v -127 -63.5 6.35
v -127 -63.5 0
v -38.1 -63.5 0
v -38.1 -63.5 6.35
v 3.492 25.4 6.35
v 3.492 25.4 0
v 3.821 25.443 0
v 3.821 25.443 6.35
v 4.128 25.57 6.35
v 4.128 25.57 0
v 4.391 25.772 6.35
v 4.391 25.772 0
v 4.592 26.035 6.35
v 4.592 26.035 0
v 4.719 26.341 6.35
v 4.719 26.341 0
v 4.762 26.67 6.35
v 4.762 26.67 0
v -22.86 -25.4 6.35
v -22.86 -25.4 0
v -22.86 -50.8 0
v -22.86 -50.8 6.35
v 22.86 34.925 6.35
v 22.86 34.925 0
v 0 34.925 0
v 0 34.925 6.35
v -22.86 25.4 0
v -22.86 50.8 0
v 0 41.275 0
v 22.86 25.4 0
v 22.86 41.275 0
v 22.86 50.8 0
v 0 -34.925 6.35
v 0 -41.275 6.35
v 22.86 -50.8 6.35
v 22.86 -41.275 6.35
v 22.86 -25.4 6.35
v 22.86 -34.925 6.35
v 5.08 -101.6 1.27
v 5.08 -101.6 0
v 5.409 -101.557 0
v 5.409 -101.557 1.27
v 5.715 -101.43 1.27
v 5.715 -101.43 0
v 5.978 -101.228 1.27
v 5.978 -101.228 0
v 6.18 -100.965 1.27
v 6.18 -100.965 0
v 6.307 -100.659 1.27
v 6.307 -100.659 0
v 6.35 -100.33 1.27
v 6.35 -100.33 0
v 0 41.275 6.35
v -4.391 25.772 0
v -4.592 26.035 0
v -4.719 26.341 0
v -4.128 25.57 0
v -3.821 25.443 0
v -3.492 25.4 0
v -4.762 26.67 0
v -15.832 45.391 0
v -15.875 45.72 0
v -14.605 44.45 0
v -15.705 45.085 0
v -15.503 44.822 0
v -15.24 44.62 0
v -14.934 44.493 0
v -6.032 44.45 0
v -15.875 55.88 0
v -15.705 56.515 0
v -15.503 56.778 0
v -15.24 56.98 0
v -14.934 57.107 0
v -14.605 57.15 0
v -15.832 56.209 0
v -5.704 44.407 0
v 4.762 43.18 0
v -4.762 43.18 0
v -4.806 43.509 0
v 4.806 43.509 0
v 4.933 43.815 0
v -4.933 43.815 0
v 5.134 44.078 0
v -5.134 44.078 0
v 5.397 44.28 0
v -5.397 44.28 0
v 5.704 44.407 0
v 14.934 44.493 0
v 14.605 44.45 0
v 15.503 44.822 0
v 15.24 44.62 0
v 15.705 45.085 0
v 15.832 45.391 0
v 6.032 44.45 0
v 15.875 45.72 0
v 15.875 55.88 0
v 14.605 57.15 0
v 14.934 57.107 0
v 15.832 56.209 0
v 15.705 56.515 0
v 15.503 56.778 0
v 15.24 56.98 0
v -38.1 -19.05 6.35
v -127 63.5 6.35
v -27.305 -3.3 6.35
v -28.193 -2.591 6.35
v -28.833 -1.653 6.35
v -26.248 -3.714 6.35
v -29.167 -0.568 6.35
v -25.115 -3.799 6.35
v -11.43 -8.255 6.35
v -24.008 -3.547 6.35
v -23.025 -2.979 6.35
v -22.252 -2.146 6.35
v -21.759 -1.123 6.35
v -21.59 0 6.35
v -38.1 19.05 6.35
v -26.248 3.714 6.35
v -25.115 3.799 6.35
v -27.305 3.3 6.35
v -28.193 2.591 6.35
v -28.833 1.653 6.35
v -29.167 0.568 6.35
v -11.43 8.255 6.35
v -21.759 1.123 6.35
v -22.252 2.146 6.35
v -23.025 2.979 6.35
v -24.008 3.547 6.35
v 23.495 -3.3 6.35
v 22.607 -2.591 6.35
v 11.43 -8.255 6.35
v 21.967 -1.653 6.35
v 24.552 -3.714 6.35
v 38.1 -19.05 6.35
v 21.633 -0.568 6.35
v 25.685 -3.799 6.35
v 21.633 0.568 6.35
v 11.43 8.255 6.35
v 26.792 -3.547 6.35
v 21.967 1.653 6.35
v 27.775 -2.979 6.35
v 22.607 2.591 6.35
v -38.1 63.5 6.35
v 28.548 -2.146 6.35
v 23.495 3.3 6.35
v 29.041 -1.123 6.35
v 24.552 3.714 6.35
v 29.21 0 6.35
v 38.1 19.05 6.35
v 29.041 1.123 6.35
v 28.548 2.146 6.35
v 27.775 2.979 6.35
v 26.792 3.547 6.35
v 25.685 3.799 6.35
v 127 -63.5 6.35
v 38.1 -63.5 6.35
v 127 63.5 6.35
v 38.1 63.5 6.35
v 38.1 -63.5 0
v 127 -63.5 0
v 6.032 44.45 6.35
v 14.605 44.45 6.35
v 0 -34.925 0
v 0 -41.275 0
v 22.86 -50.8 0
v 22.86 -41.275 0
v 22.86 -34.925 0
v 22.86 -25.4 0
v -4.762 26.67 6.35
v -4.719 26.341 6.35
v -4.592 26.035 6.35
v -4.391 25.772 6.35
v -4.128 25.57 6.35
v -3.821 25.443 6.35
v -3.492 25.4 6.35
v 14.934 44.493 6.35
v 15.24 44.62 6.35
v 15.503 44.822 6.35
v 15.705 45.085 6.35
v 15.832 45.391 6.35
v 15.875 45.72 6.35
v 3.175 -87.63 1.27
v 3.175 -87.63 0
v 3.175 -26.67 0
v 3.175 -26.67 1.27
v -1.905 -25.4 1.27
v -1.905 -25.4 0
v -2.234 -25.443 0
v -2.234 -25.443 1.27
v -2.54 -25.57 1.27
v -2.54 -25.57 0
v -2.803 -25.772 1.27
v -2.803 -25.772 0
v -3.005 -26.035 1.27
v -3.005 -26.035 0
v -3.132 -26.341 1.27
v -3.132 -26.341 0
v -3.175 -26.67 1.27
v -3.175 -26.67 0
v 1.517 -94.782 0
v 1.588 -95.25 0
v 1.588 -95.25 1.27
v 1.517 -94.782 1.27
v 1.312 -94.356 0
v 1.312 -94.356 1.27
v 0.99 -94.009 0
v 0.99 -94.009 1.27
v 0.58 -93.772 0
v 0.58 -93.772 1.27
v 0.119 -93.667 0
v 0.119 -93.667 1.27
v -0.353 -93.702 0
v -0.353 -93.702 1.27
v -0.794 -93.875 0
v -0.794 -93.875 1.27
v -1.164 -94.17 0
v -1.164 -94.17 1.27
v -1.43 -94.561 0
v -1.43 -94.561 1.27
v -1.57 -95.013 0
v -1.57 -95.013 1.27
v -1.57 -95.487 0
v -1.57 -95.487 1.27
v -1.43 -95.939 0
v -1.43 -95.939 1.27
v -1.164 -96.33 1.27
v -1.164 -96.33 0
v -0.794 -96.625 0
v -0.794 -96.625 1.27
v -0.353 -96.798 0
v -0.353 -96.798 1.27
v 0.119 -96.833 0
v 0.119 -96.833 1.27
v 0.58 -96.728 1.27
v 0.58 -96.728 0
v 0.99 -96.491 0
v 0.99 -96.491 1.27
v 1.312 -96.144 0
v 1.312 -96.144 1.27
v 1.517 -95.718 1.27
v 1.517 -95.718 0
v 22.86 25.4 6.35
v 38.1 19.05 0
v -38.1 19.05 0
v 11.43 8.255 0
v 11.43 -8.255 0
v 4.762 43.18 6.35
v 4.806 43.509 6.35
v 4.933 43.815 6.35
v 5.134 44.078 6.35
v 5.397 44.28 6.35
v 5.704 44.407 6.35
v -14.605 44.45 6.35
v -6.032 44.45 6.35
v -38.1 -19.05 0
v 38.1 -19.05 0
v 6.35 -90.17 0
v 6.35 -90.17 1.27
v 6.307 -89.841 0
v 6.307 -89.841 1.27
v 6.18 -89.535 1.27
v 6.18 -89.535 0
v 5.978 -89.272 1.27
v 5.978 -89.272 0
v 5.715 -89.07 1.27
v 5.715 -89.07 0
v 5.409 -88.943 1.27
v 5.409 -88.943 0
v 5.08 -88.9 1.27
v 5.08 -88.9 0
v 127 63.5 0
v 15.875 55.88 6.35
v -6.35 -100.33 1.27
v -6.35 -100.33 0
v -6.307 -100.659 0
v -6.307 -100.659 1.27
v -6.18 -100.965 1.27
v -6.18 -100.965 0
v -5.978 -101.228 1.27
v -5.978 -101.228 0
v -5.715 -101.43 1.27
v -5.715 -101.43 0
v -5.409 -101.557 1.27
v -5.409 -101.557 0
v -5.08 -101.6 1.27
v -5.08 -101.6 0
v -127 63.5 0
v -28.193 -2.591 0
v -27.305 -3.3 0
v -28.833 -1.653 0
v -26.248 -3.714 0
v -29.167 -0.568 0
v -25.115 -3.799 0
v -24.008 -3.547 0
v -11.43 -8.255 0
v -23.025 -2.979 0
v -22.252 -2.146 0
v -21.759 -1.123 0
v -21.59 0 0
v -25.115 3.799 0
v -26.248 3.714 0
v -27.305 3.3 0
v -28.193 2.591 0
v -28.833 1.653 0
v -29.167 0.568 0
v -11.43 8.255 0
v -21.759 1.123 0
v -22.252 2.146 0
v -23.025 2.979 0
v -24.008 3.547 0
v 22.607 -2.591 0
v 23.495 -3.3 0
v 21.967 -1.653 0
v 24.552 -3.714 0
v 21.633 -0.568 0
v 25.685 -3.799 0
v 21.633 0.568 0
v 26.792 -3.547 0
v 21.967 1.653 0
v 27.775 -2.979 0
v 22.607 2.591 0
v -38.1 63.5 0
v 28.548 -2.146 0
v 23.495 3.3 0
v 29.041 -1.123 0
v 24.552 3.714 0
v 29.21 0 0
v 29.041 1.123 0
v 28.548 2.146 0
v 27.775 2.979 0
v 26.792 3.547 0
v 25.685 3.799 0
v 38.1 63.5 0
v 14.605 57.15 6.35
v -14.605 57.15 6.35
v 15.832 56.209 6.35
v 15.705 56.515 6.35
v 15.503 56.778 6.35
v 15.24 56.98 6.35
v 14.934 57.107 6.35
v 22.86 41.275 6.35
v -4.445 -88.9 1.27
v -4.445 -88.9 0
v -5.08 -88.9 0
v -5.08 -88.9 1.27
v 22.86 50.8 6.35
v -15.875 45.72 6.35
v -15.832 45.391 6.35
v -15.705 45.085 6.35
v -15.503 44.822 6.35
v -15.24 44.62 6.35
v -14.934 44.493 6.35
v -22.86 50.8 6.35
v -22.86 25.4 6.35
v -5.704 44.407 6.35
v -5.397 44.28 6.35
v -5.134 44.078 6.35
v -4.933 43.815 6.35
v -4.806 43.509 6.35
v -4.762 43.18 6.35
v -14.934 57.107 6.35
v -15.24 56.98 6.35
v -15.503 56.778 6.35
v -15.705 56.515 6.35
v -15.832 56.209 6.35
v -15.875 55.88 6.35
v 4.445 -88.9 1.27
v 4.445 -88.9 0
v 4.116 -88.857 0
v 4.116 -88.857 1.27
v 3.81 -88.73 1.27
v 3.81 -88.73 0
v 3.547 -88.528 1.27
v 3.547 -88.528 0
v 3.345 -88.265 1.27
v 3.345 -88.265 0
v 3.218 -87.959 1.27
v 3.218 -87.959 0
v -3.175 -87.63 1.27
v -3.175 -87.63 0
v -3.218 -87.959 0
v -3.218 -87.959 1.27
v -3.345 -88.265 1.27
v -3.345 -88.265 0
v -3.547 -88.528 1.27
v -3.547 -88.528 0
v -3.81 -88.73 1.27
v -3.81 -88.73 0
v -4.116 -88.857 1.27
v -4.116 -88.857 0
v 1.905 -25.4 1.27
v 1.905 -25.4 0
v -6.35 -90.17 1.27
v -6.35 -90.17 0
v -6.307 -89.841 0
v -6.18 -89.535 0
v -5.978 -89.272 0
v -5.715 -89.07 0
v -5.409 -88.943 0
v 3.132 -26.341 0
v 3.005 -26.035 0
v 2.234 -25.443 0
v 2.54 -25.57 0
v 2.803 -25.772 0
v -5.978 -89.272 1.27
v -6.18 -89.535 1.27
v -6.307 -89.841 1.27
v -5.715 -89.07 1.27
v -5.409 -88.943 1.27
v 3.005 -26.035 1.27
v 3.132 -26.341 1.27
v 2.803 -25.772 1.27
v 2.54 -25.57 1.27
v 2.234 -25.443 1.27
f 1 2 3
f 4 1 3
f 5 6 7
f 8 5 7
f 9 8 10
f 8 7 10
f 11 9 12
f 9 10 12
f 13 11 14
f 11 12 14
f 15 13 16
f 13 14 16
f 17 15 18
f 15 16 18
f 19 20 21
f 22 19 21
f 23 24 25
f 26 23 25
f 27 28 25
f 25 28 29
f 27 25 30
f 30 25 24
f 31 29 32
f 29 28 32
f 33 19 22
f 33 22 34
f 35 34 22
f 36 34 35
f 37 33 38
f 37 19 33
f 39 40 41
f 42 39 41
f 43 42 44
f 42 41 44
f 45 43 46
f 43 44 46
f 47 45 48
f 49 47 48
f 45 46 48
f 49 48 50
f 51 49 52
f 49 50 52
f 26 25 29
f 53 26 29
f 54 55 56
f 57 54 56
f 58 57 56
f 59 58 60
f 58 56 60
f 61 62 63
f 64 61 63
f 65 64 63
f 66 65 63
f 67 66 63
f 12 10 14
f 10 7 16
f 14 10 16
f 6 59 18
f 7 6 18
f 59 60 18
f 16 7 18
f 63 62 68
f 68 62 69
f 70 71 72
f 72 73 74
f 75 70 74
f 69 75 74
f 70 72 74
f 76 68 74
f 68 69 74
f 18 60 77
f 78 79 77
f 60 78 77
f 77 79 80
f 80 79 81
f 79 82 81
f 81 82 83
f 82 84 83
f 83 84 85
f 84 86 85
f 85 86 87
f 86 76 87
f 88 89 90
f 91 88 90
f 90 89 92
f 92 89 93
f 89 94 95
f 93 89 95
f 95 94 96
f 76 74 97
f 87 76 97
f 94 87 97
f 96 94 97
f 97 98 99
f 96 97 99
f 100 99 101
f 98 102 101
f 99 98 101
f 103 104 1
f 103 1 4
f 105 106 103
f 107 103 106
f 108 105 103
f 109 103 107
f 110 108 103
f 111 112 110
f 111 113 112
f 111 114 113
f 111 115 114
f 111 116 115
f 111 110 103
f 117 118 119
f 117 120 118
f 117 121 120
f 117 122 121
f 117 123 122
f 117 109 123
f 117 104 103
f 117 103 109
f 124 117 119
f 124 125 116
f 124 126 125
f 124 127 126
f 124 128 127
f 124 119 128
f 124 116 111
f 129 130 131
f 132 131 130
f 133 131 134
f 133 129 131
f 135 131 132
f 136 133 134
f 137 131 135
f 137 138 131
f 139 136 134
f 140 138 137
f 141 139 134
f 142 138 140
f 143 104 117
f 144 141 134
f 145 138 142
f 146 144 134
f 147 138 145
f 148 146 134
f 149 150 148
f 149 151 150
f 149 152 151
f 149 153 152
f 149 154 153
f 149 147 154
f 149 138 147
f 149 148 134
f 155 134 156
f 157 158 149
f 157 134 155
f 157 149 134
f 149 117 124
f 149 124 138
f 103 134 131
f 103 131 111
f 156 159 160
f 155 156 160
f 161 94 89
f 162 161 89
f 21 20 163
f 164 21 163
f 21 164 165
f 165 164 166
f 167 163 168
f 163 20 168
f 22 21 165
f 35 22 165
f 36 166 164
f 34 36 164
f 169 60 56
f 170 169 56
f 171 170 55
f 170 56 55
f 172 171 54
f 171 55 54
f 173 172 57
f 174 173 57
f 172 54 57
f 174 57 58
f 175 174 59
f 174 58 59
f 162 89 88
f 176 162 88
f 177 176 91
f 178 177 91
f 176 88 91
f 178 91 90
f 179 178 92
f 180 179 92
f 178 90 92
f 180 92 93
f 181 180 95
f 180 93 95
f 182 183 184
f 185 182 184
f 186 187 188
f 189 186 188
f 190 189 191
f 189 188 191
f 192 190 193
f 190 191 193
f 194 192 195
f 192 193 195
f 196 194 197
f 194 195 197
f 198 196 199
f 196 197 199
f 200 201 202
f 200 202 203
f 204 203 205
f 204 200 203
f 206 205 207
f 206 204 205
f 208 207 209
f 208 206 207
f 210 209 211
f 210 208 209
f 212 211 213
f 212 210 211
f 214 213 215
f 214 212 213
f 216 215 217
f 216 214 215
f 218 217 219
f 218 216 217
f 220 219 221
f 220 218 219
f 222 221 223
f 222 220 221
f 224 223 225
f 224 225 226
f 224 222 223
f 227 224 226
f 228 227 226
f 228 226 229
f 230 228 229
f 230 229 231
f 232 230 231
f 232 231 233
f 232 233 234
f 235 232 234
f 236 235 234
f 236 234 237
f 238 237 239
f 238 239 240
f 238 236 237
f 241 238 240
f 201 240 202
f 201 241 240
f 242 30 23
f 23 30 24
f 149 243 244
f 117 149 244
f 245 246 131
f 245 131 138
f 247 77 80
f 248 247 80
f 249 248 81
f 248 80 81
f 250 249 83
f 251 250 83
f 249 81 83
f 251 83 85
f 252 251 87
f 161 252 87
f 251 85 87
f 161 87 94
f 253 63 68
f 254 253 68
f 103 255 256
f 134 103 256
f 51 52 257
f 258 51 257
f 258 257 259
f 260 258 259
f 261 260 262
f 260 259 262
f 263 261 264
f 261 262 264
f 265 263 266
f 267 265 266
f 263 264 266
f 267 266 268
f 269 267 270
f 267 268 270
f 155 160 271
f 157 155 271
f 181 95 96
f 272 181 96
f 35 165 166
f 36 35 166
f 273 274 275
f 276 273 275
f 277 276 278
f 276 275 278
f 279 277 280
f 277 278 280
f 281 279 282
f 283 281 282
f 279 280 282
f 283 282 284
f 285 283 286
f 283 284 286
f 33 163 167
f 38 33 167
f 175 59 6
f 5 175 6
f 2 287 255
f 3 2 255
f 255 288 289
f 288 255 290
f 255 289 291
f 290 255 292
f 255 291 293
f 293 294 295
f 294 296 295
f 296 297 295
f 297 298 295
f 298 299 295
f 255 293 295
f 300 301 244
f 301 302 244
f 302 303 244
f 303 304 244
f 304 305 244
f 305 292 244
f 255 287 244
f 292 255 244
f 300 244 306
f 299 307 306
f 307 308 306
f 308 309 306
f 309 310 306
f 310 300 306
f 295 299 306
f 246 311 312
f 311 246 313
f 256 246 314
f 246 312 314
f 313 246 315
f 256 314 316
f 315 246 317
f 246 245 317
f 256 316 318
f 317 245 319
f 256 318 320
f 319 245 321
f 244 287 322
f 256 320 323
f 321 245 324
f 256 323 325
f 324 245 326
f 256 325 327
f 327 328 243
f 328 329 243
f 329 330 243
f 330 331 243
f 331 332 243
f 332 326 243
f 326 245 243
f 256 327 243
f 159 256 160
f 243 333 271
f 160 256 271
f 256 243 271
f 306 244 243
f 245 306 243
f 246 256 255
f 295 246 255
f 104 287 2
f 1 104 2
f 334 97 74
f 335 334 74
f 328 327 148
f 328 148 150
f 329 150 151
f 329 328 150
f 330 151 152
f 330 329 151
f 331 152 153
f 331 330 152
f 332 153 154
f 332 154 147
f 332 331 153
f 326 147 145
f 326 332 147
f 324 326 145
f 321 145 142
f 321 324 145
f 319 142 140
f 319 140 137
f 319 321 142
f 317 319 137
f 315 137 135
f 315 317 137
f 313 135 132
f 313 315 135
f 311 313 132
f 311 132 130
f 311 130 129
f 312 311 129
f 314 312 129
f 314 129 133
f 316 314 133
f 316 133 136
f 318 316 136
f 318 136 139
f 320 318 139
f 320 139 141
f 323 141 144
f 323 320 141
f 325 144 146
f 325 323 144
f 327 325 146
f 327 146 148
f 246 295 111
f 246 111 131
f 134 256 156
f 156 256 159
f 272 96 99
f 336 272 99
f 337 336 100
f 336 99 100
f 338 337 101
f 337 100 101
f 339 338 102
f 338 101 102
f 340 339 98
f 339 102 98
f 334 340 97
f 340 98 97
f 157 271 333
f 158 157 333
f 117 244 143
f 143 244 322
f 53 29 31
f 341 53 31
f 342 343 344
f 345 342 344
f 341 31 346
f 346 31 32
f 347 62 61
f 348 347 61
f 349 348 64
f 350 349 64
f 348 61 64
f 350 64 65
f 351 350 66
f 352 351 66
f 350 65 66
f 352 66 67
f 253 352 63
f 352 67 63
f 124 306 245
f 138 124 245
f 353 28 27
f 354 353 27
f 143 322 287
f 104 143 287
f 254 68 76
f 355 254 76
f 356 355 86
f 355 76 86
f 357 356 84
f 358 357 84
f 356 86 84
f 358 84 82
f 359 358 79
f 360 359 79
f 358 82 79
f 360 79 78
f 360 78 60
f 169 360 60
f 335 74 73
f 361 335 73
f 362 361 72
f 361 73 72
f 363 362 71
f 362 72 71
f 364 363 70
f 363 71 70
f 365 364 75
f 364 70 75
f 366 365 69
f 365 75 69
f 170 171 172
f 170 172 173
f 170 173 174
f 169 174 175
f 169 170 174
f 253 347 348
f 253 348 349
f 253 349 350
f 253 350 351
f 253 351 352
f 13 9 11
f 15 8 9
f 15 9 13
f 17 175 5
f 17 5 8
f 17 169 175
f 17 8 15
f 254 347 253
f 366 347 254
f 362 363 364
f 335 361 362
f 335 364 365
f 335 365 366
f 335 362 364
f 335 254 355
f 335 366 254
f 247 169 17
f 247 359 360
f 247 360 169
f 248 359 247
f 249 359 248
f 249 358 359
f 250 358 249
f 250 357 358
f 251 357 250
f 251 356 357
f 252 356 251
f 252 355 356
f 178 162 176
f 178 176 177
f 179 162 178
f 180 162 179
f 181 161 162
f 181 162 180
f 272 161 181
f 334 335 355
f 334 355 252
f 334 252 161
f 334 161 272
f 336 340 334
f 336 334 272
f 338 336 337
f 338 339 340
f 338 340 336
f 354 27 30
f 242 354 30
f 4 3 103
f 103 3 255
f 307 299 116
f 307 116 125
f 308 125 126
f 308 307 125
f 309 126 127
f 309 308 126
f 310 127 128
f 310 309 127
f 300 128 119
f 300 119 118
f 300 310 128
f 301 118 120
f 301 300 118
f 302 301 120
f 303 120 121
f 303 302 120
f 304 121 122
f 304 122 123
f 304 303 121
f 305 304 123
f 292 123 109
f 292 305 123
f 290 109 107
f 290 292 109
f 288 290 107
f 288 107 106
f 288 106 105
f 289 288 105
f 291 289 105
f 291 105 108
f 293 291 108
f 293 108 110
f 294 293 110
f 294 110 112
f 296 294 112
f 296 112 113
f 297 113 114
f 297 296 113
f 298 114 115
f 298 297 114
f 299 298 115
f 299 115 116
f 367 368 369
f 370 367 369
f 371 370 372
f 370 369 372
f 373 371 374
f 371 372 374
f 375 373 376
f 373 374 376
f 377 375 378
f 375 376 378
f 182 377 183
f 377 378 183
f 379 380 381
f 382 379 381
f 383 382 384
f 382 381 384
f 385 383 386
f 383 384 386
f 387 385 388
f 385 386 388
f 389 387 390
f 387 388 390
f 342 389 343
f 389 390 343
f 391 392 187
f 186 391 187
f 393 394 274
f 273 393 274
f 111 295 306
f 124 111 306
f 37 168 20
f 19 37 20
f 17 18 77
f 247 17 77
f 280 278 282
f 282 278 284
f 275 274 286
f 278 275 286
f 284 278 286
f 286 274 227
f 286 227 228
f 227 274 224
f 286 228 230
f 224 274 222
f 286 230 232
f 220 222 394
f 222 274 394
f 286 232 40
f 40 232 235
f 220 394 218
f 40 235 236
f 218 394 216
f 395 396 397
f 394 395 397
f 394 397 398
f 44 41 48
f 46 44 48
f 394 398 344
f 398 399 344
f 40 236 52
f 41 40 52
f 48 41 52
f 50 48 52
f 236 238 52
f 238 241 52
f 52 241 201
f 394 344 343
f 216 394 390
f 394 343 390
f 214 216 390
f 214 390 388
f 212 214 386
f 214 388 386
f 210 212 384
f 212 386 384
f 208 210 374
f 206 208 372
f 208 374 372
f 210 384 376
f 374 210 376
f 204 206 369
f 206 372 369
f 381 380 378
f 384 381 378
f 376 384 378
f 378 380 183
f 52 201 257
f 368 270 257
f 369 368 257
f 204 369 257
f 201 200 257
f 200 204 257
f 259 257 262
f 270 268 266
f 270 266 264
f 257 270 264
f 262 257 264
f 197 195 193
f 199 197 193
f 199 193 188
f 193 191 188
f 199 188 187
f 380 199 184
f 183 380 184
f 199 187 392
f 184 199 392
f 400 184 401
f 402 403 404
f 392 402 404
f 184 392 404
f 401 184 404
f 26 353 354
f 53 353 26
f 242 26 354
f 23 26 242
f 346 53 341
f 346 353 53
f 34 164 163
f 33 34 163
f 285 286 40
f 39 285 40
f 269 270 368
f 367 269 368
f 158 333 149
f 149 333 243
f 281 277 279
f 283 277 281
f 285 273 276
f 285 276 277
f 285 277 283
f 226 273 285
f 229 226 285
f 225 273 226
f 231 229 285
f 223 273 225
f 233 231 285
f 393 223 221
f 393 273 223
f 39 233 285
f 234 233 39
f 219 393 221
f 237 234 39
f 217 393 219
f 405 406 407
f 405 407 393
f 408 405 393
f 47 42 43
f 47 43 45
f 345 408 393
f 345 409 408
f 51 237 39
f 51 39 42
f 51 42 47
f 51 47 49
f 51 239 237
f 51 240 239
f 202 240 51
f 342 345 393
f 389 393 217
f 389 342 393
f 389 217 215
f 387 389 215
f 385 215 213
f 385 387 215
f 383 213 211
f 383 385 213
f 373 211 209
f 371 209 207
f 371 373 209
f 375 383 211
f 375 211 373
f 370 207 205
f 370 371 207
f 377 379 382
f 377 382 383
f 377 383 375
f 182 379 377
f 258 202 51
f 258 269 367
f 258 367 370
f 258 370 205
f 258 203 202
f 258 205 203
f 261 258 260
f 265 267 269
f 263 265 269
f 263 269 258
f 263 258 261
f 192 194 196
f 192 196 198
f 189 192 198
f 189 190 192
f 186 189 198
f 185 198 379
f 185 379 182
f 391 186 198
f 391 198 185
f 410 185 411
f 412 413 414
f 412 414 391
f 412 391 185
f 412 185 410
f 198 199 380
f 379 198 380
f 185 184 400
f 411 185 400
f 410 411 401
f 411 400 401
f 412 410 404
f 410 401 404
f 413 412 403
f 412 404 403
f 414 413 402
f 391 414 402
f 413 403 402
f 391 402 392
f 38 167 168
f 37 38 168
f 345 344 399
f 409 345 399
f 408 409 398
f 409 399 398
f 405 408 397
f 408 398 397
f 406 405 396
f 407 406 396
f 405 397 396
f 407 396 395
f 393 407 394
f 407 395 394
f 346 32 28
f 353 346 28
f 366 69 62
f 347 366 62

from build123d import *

# Parameters (mm, degrees)
F0_R     = 3.81
F0_W     = 22.86
F0_H     = 16.51
F1_DEPTH = 6.35
F3_DEPTH = 6.35
F2_R     = 1.5875
F4_DEPTH = 1.27


with BuildPart() as f1:
    # F0 (on Top) → F1 (new body)
    with BuildSketch(Plane.XY):
        Polygon((127, -63.5), (127, 63.5), (38.1, 63.5), (38.1, 57.15), (38.1, 19.05), (-38.1, 19.05), (-38.1, 57.15), (-38.1, 63.5), (-127, 63.5), (-127, -63.5), (-38.1, -63.5), (-38.1, -57.15), (-38.1, -19.05), (38.1, -19.05), (38.1, -57.15), (38.1, -63.5), align=None)
        with Locations((-25.4, 0)):
            Circle(F0_R, mode=Mode.SUBTRACT)
        Rectangle(F0_W, F0_H, mode=Mode.SUBTRACT)
        with Locations((25.4, 0)):
            Circle(F0_R, mode=Mode.SUBTRACT)
        Polygon((22.86, -34.925), (22.86, -25.4), (-22.86, -25.4), (-22.86, -50.8), (22.86, -50.8), (22.86, -41.275), (0, -41.275), (0, -34.925), align=None)
        Polygon((22.86, 34.925), (0, 34.925), (0, 41.275), (22.86, 41.275), (22.86, 50.8), (-22.86, 50.8), (-22.86, 25.4), (22.86, 25.4), align=None)
    extrude(amount=F1_DEPTH)


with BuildPart() as f3:
    # F2 (on Top) → F3 (new body)
    with BuildSketch(Plane.XY):
        with BuildLine():
            Line((6.0325, 44.45), (14.605, 44.45))
            ThreePointArc((14.605, 44.45), (15.503026, 44.821974), (15.875, 45.72))
            Line((15.875, 45.72), (15.875, 55.88))
            ThreePointArc((15.875, 55.88), (15.503026, 56.778026), (14.605, 57.15))
            Line((14.605, 57.15), (-14.605, 57.15))
            ThreePointArc((-14.605, 57.15), (-15.503026, 56.778026), (-15.875, 55.88))
            Line((-15.875, 55.88), (-15.875, 45.72))
            ThreePointArc((-15.875, 45.72), (-15.503026, 44.821974), (-14.605, 44.45))
            Line((-14.605, 44.45), (-6.0325, 44.45))
            ThreePointArc((-6.0325, 44.45), (-5.134474, 44.078026), (-4.7625, 43.18))
            Line((-4.7625, 43.18), (-4.7625, 26.67))
            ThreePointArc((-4.7625, 26.67), (-4.390526, 25.771974), (-3.4925, 25.4))
            Line((-3.4925, 25.4), (3.4925, 25.4))
            ThreePointArc((3.4925, 25.4), (4.390526, 25.771974), (4.7625, 26.67))
            Line((4.7625, 26.67), (4.7625, 43.18))
            ThreePointArc((4.7625, 43.18), (5.134474, 44.078026), (6.0325, 44.45))
        make_face()
    extrude(amount=F3_DEPTH)


with BuildPart() as f4:
    # F2 (on Top) → F4 (new body)
    with BuildSketch(Plane.XY):
        with BuildLine():
            ThreePointArc((3.175, -26.67), (2.803026, -25.771974), (1.905, -25.4))
            Line((1.905, -25.4), (-1.905, -25.4))
            ThreePointArc((-1.905, -25.4), (-2.803026, -25.771974), (-3.175, -26.67))
            Line((-3.175, -26.67), (-3.175, -87.63))
            ThreePointArc((-3.175, -87.63), (-3.546974, -88.528026), (-4.445, -88.9))
            Line((-4.445, -88.9), (-5.08, -88.9))
            ThreePointArc((-5.08, -88.9), (-5.978026, -89.271974), (-6.35, -90.17))
            Line((-6.35, -90.17), (-6.35, -100.33))
            ThreePointArc((-6.35, -100.33), (-5.978026, -101.228026), (-5.08, -101.6))
            Line((-5.08, -101.6), (5.08, -101.6))
            ThreePointArc((5.08, -101.6), (5.978026, -101.228026), (6.35, -100.33))
            Line((6.35, -100.33), (6.35, -90.17))
            ThreePointArc((6.35, -90.17), (5.978026, -89.271974), (5.08, -88.9))
            Line((5.08, -88.9), (4.445, -88.9))
            ThreePointArc((4.445, -88.9), (3.546974, -88.528026), (3.175, -87.63))
            Line((3.175, -87.63), (3.175, -26.67))
        make_face()
        with Locations((0, -95.25)):
            Circle(F2_R, mode=Mode.SUBTRACT)
    extrude(amount=F4_DEPTH)


solid = Compound([f1.part, f3.part, f4.part])
